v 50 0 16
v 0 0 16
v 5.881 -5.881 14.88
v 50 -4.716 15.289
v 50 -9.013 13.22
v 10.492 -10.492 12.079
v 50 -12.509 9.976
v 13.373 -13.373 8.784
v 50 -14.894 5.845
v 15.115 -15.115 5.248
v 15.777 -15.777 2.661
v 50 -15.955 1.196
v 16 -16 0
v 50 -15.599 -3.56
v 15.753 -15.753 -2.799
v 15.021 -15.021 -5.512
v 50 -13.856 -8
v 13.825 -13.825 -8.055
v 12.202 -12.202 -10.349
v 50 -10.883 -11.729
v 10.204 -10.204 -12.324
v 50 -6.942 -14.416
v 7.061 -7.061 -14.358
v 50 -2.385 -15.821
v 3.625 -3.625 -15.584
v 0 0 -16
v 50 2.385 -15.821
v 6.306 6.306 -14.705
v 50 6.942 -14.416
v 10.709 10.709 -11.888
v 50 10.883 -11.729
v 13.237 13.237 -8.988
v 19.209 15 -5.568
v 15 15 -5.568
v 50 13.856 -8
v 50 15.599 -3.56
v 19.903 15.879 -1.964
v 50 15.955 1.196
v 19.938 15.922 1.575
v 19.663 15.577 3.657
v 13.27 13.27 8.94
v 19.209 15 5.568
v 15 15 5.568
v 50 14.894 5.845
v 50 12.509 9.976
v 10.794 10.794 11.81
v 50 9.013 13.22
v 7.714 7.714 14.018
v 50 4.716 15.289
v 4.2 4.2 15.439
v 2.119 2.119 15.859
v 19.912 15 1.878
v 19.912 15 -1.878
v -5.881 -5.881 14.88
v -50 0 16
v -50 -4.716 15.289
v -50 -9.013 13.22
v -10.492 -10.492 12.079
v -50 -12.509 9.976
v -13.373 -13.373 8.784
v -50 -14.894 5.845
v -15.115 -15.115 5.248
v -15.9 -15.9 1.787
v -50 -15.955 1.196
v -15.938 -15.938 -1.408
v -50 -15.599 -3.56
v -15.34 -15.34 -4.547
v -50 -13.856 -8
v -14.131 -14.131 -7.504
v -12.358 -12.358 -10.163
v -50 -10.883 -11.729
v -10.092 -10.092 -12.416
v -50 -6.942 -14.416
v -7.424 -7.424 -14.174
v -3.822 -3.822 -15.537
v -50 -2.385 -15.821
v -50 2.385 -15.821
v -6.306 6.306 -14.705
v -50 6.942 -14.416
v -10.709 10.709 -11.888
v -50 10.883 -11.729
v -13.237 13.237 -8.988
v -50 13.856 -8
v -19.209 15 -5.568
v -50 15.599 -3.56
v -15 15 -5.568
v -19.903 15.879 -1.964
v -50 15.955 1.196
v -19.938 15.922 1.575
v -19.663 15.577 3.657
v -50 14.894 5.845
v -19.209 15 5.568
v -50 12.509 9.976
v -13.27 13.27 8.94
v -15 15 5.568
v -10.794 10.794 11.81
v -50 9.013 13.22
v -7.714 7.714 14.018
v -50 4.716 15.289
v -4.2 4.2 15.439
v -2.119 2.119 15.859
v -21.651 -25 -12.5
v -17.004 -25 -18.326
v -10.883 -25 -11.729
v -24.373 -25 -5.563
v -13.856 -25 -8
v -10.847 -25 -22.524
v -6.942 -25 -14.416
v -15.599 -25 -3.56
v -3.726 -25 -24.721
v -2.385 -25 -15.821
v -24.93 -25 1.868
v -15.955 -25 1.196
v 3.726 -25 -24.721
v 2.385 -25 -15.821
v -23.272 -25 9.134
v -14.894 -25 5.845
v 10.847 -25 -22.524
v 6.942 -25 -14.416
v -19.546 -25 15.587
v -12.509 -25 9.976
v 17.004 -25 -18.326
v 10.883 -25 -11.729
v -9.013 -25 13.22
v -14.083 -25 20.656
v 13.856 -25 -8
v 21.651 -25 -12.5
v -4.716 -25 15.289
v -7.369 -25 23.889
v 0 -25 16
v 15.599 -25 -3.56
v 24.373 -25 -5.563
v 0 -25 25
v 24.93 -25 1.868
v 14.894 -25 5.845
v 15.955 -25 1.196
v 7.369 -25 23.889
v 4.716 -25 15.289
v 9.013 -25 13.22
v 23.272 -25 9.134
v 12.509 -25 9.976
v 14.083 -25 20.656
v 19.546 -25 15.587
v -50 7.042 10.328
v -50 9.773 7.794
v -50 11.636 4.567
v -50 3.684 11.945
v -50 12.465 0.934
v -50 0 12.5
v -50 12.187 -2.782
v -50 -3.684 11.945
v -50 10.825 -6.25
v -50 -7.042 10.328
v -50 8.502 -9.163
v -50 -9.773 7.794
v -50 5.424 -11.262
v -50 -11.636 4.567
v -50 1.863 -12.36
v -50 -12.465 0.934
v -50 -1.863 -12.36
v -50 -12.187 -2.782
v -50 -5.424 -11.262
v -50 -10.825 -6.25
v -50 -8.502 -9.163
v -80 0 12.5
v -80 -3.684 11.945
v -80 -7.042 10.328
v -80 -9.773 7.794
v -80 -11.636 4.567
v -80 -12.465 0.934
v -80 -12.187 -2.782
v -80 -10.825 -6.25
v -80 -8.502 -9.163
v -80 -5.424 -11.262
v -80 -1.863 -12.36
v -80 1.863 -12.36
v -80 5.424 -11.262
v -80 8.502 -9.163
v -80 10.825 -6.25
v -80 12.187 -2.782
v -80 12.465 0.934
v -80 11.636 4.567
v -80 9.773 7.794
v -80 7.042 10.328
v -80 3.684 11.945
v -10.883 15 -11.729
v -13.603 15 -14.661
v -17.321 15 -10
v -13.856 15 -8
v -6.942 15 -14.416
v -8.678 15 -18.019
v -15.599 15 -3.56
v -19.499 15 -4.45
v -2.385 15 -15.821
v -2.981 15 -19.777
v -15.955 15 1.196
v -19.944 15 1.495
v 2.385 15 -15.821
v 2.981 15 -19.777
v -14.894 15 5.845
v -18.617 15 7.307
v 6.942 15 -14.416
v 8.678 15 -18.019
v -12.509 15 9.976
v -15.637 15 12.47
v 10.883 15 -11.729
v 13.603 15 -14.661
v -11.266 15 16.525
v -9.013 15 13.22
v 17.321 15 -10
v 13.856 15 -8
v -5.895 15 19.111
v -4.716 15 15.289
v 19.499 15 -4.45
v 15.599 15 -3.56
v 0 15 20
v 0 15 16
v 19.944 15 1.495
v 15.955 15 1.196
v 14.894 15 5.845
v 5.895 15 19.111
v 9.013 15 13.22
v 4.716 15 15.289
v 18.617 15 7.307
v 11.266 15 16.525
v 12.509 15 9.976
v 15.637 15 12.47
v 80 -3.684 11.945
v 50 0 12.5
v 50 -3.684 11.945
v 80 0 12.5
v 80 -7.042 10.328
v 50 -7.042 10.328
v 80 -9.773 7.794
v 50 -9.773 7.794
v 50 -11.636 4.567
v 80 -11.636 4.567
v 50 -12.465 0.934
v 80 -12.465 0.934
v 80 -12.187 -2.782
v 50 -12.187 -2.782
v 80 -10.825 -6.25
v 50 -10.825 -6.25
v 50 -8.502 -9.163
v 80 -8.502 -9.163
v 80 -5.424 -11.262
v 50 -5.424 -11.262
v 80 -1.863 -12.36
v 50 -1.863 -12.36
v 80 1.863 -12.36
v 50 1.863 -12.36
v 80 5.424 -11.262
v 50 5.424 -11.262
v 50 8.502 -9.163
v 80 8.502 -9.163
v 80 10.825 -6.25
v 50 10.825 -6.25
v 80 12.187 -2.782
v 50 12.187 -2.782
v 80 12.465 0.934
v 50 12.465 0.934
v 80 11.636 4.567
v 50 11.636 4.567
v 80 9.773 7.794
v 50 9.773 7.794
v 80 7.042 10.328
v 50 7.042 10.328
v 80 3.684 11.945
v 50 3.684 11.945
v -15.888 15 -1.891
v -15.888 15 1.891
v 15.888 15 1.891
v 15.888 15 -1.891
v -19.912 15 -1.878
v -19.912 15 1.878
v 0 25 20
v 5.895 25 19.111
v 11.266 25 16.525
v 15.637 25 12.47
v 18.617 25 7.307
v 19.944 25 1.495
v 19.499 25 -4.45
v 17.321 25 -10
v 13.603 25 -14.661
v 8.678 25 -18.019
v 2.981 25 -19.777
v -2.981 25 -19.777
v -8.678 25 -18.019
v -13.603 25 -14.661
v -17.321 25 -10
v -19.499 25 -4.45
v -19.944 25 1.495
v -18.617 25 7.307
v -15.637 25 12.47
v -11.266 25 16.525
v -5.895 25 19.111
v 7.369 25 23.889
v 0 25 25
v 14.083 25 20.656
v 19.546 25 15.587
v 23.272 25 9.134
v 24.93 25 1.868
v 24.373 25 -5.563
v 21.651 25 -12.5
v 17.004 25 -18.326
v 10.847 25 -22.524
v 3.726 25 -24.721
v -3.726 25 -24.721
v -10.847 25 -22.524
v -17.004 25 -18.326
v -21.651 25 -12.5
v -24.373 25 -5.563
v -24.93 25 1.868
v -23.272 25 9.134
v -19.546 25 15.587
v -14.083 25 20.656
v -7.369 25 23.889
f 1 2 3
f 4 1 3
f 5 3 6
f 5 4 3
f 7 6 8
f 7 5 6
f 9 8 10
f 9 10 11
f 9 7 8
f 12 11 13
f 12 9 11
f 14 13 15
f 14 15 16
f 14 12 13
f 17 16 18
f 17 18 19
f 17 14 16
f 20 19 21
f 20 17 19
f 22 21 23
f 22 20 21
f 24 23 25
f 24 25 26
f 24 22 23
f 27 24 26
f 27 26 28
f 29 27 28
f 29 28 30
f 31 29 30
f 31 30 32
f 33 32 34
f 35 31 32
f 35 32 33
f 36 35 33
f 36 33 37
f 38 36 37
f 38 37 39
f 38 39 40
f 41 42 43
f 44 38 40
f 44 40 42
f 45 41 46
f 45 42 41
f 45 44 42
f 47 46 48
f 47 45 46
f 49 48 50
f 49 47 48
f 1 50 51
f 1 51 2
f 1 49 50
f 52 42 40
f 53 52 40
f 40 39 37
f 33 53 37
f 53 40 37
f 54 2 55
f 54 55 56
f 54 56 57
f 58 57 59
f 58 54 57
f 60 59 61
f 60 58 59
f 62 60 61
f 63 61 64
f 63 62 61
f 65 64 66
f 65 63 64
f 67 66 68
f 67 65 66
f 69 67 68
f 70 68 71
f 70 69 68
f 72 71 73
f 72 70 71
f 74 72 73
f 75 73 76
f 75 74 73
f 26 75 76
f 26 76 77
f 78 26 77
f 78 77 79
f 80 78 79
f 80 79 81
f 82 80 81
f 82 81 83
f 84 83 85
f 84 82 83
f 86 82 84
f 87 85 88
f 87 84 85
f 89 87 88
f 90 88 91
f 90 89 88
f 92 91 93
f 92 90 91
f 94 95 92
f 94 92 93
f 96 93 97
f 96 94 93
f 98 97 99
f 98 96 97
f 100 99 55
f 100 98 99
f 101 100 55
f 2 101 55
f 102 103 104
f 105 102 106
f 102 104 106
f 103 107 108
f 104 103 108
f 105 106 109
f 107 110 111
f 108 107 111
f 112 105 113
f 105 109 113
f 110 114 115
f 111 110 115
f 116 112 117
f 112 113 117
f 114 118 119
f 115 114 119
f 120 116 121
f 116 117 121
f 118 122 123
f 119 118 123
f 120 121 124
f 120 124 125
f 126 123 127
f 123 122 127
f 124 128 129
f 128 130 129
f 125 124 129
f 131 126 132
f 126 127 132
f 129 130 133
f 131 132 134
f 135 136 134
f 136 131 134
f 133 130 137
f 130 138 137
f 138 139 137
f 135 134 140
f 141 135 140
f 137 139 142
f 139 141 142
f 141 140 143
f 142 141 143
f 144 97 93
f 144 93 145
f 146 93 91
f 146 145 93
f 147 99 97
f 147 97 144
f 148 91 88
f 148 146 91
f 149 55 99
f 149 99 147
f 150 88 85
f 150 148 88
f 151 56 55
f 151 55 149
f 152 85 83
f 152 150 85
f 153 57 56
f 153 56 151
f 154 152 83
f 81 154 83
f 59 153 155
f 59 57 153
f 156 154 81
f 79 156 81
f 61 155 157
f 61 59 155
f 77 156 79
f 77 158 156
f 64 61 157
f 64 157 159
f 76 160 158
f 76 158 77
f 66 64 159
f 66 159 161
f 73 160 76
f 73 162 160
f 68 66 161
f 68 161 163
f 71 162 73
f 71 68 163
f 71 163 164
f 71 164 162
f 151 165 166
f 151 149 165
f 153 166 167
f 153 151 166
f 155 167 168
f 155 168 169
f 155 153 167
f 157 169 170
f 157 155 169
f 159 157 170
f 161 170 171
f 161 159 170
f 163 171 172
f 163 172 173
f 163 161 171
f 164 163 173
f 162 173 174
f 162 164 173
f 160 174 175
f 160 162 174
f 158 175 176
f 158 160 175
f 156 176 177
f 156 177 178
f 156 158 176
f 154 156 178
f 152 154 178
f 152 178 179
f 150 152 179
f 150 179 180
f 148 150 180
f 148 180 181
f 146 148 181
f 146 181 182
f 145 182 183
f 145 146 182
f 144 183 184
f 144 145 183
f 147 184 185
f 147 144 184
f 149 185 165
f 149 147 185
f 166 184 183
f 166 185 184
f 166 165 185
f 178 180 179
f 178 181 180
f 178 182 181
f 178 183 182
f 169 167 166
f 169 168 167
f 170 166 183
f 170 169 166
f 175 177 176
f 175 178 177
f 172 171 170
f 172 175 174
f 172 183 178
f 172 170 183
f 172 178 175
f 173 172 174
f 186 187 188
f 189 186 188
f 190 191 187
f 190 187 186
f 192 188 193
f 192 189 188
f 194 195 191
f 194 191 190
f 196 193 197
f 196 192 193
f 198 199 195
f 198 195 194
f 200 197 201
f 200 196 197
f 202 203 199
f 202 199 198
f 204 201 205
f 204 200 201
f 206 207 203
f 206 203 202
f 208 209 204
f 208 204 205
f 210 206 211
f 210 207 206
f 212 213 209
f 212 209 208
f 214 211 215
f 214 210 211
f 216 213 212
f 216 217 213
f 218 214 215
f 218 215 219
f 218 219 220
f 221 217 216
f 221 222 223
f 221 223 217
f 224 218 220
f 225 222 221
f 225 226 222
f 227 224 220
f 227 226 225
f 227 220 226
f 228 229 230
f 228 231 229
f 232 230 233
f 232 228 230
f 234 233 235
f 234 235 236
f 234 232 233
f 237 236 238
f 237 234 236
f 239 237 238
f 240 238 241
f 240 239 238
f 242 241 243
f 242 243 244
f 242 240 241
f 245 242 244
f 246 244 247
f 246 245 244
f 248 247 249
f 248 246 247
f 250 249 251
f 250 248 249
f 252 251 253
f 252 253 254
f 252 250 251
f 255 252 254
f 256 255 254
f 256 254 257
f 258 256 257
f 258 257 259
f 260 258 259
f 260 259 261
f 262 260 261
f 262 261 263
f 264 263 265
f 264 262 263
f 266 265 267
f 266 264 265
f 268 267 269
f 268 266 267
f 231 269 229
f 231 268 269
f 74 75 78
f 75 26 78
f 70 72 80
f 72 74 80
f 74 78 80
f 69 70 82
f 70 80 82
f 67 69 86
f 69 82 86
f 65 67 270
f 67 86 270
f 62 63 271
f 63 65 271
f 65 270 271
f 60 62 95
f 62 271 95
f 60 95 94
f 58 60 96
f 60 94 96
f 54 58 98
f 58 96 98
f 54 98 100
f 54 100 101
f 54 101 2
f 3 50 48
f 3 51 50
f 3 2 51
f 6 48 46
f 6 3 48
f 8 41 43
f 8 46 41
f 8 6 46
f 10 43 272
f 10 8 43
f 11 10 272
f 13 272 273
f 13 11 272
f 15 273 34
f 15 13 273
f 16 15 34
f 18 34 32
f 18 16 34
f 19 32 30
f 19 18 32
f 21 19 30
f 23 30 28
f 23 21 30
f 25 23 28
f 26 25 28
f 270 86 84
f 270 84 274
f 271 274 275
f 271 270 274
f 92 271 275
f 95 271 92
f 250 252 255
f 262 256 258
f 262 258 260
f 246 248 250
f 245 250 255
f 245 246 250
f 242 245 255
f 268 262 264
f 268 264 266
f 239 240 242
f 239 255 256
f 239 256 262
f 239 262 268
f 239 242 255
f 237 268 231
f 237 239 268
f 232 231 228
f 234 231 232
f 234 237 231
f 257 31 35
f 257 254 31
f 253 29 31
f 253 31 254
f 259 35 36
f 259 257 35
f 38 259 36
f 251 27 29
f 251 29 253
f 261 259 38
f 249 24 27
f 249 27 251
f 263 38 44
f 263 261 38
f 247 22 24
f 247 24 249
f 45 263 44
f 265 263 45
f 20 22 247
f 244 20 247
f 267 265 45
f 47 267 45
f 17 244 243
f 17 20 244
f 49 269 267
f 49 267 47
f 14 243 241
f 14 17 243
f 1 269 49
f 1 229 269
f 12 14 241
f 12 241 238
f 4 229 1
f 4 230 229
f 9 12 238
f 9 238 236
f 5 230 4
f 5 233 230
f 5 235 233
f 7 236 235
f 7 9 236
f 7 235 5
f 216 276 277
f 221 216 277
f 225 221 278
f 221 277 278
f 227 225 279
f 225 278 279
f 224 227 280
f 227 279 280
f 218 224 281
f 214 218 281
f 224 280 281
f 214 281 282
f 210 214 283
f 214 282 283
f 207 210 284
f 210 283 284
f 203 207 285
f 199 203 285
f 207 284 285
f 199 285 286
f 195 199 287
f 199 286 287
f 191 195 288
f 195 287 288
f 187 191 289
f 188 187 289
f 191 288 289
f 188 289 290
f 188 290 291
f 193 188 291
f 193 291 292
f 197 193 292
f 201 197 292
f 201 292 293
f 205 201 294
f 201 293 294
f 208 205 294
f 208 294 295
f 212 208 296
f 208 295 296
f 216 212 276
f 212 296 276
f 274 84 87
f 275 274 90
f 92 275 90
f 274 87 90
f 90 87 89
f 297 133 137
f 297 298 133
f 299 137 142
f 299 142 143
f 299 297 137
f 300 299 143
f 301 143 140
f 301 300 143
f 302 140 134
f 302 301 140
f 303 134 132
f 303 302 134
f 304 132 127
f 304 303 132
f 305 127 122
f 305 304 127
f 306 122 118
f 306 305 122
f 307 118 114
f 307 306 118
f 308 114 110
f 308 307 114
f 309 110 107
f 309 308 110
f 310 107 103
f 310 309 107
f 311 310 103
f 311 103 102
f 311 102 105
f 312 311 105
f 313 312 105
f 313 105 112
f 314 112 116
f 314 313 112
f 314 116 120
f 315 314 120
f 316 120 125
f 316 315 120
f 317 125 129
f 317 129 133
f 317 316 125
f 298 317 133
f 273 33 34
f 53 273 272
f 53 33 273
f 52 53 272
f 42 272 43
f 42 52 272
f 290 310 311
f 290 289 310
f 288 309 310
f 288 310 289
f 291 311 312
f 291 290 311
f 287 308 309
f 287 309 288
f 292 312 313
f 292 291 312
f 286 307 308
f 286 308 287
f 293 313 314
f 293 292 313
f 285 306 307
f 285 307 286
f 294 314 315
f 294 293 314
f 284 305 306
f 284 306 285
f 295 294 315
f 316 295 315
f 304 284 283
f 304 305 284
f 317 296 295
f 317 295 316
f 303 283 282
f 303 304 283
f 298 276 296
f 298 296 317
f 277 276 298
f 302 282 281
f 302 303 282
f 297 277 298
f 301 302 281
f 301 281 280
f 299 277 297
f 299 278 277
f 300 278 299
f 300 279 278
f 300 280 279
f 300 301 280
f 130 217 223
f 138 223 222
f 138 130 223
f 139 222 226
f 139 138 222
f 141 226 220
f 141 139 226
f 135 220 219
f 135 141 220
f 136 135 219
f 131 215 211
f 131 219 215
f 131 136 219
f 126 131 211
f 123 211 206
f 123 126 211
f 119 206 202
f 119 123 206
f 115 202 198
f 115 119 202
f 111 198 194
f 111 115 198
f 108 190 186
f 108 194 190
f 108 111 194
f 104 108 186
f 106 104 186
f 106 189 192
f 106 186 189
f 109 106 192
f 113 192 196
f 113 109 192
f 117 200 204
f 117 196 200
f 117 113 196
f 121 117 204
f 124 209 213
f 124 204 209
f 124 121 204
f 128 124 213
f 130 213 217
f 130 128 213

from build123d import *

# Parameters (mm, degrees)
SKETCH2_R               = 25
SKETCH2_R_2             = 16
BOSS_EXTRUDE2_DEPTH     = 25
CUT_EXTRUDE1_DEPTH      = 88.464278423
CUT_EXTRUDE1_DEPTH_BACK = 88.464278423
SKETCH2_3_R             = 16
SKETCH3_R               = 20
CUT_EXTRUDE2_DEPTH      = 10


with BuildPart() as part:
    # Sketch1 → Revolve2 (revolve)
    with BuildSketch(Plane(origin=(0, 0, 0), x_dir=(1, 0, 0), z_dir=(0, 1, 0))):
        Polygon((-80, -12.5), (-50, -12.5), (-50, -16), (50, -16), (50, -12.5), (80, -12.5), (80, 0), (79.691777251, 0), (-80, 0), align=None)
    revolve(axis=Axis((50, 0, 0), (1, 0, 0)))

    # Sketch2<3> → Cut-Extrude1 (cut, two sides: drawn at the far end of the back side and taken through both)
    with BuildSketch(Plane(origin=(0, 0, 0), x_dir=(1, 0, 0), z_dir=(0, 1, 0)).offset(-CUT_EXTRUDE1_DEPTH_BACK)):
        Circle(SKETCH2_3_R)
    extrude(amount=CUT_EXTRUDE1_DEPTH + CUT_EXTRUDE1_DEPTH_BACK, mode=Mode.SUBTRACT)


with BuildPart() as body_2:
    # Sketch2 → Boss-Extrude2 (new, symmetric)
    with BuildSketch(Plane(origin=(0, 0, 0), x_dir=(1, 0, 0), z_dir=(0, 1, 0))):
        Circle(SKETCH2_R)
        Circle(SKETCH2_R_2, mode=Mode.SUBTRACT)
    extrude(amount=BOSS_EXTRUDE2_DEPTH, both=True)


with BuildPart() as cut_extrude1_piece_1:
    # of the separate pieces the step leaves, piece 1, a body of its own (cut_extrude1_pieces)
    add(part.part.solids().sort_by_distance((-80, 0, 12.5))[0])


with BuildPart() as cut_extrude1_piece_2:
    # of the separate pieces the step leaves, piece 2, a body of its own (cut_extrude1_pieces)
    add(part.part.solids().sort_by_distance((16, 16, 0))[0])


with BuildPart() as cut_extrude2_tool:
    # Sketch3 → Cut-Extrude2 (new body)
    with BuildSketch(Plane(origin=(0, 25, 0), x_dir=(1, 0, 0), z_dir=(0, 1, 0))):
        Circle(SKETCH3_R)
    extrude(amount=-CUT_EXTRUDE2_DEPTH)


with BuildPart() as body_2_1:
    add(body_2.part)

    # Cut-Extrude2: cut by cut_extrude2_tool
    add(cut_extrude2_tool.part, mode=Mode.SUBTRACT)


with BuildPart() as cut_extrude1_piece_1_1:
    add(cut_extrude1_piece_1.part)

    # Cut-Extrude2: cut by cut_extrude2_tool
    add(cut_extrude2_tool.part, mode=Mode.SUBTRACT)


with BuildPart() as cut_extrude1_piece_2_1:
    add(cut_extrude1_piece_2.part)

    # Cut-Extrude2: cut by cut_extrude2_tool
    add(cut_extrude2_tool.part, mode=Mode.SUBTRACT)


solid = Compound([body_2_1.part, cut_extrude1_piece_1_1.part, cut_extrude1_piece_2_1.part])
